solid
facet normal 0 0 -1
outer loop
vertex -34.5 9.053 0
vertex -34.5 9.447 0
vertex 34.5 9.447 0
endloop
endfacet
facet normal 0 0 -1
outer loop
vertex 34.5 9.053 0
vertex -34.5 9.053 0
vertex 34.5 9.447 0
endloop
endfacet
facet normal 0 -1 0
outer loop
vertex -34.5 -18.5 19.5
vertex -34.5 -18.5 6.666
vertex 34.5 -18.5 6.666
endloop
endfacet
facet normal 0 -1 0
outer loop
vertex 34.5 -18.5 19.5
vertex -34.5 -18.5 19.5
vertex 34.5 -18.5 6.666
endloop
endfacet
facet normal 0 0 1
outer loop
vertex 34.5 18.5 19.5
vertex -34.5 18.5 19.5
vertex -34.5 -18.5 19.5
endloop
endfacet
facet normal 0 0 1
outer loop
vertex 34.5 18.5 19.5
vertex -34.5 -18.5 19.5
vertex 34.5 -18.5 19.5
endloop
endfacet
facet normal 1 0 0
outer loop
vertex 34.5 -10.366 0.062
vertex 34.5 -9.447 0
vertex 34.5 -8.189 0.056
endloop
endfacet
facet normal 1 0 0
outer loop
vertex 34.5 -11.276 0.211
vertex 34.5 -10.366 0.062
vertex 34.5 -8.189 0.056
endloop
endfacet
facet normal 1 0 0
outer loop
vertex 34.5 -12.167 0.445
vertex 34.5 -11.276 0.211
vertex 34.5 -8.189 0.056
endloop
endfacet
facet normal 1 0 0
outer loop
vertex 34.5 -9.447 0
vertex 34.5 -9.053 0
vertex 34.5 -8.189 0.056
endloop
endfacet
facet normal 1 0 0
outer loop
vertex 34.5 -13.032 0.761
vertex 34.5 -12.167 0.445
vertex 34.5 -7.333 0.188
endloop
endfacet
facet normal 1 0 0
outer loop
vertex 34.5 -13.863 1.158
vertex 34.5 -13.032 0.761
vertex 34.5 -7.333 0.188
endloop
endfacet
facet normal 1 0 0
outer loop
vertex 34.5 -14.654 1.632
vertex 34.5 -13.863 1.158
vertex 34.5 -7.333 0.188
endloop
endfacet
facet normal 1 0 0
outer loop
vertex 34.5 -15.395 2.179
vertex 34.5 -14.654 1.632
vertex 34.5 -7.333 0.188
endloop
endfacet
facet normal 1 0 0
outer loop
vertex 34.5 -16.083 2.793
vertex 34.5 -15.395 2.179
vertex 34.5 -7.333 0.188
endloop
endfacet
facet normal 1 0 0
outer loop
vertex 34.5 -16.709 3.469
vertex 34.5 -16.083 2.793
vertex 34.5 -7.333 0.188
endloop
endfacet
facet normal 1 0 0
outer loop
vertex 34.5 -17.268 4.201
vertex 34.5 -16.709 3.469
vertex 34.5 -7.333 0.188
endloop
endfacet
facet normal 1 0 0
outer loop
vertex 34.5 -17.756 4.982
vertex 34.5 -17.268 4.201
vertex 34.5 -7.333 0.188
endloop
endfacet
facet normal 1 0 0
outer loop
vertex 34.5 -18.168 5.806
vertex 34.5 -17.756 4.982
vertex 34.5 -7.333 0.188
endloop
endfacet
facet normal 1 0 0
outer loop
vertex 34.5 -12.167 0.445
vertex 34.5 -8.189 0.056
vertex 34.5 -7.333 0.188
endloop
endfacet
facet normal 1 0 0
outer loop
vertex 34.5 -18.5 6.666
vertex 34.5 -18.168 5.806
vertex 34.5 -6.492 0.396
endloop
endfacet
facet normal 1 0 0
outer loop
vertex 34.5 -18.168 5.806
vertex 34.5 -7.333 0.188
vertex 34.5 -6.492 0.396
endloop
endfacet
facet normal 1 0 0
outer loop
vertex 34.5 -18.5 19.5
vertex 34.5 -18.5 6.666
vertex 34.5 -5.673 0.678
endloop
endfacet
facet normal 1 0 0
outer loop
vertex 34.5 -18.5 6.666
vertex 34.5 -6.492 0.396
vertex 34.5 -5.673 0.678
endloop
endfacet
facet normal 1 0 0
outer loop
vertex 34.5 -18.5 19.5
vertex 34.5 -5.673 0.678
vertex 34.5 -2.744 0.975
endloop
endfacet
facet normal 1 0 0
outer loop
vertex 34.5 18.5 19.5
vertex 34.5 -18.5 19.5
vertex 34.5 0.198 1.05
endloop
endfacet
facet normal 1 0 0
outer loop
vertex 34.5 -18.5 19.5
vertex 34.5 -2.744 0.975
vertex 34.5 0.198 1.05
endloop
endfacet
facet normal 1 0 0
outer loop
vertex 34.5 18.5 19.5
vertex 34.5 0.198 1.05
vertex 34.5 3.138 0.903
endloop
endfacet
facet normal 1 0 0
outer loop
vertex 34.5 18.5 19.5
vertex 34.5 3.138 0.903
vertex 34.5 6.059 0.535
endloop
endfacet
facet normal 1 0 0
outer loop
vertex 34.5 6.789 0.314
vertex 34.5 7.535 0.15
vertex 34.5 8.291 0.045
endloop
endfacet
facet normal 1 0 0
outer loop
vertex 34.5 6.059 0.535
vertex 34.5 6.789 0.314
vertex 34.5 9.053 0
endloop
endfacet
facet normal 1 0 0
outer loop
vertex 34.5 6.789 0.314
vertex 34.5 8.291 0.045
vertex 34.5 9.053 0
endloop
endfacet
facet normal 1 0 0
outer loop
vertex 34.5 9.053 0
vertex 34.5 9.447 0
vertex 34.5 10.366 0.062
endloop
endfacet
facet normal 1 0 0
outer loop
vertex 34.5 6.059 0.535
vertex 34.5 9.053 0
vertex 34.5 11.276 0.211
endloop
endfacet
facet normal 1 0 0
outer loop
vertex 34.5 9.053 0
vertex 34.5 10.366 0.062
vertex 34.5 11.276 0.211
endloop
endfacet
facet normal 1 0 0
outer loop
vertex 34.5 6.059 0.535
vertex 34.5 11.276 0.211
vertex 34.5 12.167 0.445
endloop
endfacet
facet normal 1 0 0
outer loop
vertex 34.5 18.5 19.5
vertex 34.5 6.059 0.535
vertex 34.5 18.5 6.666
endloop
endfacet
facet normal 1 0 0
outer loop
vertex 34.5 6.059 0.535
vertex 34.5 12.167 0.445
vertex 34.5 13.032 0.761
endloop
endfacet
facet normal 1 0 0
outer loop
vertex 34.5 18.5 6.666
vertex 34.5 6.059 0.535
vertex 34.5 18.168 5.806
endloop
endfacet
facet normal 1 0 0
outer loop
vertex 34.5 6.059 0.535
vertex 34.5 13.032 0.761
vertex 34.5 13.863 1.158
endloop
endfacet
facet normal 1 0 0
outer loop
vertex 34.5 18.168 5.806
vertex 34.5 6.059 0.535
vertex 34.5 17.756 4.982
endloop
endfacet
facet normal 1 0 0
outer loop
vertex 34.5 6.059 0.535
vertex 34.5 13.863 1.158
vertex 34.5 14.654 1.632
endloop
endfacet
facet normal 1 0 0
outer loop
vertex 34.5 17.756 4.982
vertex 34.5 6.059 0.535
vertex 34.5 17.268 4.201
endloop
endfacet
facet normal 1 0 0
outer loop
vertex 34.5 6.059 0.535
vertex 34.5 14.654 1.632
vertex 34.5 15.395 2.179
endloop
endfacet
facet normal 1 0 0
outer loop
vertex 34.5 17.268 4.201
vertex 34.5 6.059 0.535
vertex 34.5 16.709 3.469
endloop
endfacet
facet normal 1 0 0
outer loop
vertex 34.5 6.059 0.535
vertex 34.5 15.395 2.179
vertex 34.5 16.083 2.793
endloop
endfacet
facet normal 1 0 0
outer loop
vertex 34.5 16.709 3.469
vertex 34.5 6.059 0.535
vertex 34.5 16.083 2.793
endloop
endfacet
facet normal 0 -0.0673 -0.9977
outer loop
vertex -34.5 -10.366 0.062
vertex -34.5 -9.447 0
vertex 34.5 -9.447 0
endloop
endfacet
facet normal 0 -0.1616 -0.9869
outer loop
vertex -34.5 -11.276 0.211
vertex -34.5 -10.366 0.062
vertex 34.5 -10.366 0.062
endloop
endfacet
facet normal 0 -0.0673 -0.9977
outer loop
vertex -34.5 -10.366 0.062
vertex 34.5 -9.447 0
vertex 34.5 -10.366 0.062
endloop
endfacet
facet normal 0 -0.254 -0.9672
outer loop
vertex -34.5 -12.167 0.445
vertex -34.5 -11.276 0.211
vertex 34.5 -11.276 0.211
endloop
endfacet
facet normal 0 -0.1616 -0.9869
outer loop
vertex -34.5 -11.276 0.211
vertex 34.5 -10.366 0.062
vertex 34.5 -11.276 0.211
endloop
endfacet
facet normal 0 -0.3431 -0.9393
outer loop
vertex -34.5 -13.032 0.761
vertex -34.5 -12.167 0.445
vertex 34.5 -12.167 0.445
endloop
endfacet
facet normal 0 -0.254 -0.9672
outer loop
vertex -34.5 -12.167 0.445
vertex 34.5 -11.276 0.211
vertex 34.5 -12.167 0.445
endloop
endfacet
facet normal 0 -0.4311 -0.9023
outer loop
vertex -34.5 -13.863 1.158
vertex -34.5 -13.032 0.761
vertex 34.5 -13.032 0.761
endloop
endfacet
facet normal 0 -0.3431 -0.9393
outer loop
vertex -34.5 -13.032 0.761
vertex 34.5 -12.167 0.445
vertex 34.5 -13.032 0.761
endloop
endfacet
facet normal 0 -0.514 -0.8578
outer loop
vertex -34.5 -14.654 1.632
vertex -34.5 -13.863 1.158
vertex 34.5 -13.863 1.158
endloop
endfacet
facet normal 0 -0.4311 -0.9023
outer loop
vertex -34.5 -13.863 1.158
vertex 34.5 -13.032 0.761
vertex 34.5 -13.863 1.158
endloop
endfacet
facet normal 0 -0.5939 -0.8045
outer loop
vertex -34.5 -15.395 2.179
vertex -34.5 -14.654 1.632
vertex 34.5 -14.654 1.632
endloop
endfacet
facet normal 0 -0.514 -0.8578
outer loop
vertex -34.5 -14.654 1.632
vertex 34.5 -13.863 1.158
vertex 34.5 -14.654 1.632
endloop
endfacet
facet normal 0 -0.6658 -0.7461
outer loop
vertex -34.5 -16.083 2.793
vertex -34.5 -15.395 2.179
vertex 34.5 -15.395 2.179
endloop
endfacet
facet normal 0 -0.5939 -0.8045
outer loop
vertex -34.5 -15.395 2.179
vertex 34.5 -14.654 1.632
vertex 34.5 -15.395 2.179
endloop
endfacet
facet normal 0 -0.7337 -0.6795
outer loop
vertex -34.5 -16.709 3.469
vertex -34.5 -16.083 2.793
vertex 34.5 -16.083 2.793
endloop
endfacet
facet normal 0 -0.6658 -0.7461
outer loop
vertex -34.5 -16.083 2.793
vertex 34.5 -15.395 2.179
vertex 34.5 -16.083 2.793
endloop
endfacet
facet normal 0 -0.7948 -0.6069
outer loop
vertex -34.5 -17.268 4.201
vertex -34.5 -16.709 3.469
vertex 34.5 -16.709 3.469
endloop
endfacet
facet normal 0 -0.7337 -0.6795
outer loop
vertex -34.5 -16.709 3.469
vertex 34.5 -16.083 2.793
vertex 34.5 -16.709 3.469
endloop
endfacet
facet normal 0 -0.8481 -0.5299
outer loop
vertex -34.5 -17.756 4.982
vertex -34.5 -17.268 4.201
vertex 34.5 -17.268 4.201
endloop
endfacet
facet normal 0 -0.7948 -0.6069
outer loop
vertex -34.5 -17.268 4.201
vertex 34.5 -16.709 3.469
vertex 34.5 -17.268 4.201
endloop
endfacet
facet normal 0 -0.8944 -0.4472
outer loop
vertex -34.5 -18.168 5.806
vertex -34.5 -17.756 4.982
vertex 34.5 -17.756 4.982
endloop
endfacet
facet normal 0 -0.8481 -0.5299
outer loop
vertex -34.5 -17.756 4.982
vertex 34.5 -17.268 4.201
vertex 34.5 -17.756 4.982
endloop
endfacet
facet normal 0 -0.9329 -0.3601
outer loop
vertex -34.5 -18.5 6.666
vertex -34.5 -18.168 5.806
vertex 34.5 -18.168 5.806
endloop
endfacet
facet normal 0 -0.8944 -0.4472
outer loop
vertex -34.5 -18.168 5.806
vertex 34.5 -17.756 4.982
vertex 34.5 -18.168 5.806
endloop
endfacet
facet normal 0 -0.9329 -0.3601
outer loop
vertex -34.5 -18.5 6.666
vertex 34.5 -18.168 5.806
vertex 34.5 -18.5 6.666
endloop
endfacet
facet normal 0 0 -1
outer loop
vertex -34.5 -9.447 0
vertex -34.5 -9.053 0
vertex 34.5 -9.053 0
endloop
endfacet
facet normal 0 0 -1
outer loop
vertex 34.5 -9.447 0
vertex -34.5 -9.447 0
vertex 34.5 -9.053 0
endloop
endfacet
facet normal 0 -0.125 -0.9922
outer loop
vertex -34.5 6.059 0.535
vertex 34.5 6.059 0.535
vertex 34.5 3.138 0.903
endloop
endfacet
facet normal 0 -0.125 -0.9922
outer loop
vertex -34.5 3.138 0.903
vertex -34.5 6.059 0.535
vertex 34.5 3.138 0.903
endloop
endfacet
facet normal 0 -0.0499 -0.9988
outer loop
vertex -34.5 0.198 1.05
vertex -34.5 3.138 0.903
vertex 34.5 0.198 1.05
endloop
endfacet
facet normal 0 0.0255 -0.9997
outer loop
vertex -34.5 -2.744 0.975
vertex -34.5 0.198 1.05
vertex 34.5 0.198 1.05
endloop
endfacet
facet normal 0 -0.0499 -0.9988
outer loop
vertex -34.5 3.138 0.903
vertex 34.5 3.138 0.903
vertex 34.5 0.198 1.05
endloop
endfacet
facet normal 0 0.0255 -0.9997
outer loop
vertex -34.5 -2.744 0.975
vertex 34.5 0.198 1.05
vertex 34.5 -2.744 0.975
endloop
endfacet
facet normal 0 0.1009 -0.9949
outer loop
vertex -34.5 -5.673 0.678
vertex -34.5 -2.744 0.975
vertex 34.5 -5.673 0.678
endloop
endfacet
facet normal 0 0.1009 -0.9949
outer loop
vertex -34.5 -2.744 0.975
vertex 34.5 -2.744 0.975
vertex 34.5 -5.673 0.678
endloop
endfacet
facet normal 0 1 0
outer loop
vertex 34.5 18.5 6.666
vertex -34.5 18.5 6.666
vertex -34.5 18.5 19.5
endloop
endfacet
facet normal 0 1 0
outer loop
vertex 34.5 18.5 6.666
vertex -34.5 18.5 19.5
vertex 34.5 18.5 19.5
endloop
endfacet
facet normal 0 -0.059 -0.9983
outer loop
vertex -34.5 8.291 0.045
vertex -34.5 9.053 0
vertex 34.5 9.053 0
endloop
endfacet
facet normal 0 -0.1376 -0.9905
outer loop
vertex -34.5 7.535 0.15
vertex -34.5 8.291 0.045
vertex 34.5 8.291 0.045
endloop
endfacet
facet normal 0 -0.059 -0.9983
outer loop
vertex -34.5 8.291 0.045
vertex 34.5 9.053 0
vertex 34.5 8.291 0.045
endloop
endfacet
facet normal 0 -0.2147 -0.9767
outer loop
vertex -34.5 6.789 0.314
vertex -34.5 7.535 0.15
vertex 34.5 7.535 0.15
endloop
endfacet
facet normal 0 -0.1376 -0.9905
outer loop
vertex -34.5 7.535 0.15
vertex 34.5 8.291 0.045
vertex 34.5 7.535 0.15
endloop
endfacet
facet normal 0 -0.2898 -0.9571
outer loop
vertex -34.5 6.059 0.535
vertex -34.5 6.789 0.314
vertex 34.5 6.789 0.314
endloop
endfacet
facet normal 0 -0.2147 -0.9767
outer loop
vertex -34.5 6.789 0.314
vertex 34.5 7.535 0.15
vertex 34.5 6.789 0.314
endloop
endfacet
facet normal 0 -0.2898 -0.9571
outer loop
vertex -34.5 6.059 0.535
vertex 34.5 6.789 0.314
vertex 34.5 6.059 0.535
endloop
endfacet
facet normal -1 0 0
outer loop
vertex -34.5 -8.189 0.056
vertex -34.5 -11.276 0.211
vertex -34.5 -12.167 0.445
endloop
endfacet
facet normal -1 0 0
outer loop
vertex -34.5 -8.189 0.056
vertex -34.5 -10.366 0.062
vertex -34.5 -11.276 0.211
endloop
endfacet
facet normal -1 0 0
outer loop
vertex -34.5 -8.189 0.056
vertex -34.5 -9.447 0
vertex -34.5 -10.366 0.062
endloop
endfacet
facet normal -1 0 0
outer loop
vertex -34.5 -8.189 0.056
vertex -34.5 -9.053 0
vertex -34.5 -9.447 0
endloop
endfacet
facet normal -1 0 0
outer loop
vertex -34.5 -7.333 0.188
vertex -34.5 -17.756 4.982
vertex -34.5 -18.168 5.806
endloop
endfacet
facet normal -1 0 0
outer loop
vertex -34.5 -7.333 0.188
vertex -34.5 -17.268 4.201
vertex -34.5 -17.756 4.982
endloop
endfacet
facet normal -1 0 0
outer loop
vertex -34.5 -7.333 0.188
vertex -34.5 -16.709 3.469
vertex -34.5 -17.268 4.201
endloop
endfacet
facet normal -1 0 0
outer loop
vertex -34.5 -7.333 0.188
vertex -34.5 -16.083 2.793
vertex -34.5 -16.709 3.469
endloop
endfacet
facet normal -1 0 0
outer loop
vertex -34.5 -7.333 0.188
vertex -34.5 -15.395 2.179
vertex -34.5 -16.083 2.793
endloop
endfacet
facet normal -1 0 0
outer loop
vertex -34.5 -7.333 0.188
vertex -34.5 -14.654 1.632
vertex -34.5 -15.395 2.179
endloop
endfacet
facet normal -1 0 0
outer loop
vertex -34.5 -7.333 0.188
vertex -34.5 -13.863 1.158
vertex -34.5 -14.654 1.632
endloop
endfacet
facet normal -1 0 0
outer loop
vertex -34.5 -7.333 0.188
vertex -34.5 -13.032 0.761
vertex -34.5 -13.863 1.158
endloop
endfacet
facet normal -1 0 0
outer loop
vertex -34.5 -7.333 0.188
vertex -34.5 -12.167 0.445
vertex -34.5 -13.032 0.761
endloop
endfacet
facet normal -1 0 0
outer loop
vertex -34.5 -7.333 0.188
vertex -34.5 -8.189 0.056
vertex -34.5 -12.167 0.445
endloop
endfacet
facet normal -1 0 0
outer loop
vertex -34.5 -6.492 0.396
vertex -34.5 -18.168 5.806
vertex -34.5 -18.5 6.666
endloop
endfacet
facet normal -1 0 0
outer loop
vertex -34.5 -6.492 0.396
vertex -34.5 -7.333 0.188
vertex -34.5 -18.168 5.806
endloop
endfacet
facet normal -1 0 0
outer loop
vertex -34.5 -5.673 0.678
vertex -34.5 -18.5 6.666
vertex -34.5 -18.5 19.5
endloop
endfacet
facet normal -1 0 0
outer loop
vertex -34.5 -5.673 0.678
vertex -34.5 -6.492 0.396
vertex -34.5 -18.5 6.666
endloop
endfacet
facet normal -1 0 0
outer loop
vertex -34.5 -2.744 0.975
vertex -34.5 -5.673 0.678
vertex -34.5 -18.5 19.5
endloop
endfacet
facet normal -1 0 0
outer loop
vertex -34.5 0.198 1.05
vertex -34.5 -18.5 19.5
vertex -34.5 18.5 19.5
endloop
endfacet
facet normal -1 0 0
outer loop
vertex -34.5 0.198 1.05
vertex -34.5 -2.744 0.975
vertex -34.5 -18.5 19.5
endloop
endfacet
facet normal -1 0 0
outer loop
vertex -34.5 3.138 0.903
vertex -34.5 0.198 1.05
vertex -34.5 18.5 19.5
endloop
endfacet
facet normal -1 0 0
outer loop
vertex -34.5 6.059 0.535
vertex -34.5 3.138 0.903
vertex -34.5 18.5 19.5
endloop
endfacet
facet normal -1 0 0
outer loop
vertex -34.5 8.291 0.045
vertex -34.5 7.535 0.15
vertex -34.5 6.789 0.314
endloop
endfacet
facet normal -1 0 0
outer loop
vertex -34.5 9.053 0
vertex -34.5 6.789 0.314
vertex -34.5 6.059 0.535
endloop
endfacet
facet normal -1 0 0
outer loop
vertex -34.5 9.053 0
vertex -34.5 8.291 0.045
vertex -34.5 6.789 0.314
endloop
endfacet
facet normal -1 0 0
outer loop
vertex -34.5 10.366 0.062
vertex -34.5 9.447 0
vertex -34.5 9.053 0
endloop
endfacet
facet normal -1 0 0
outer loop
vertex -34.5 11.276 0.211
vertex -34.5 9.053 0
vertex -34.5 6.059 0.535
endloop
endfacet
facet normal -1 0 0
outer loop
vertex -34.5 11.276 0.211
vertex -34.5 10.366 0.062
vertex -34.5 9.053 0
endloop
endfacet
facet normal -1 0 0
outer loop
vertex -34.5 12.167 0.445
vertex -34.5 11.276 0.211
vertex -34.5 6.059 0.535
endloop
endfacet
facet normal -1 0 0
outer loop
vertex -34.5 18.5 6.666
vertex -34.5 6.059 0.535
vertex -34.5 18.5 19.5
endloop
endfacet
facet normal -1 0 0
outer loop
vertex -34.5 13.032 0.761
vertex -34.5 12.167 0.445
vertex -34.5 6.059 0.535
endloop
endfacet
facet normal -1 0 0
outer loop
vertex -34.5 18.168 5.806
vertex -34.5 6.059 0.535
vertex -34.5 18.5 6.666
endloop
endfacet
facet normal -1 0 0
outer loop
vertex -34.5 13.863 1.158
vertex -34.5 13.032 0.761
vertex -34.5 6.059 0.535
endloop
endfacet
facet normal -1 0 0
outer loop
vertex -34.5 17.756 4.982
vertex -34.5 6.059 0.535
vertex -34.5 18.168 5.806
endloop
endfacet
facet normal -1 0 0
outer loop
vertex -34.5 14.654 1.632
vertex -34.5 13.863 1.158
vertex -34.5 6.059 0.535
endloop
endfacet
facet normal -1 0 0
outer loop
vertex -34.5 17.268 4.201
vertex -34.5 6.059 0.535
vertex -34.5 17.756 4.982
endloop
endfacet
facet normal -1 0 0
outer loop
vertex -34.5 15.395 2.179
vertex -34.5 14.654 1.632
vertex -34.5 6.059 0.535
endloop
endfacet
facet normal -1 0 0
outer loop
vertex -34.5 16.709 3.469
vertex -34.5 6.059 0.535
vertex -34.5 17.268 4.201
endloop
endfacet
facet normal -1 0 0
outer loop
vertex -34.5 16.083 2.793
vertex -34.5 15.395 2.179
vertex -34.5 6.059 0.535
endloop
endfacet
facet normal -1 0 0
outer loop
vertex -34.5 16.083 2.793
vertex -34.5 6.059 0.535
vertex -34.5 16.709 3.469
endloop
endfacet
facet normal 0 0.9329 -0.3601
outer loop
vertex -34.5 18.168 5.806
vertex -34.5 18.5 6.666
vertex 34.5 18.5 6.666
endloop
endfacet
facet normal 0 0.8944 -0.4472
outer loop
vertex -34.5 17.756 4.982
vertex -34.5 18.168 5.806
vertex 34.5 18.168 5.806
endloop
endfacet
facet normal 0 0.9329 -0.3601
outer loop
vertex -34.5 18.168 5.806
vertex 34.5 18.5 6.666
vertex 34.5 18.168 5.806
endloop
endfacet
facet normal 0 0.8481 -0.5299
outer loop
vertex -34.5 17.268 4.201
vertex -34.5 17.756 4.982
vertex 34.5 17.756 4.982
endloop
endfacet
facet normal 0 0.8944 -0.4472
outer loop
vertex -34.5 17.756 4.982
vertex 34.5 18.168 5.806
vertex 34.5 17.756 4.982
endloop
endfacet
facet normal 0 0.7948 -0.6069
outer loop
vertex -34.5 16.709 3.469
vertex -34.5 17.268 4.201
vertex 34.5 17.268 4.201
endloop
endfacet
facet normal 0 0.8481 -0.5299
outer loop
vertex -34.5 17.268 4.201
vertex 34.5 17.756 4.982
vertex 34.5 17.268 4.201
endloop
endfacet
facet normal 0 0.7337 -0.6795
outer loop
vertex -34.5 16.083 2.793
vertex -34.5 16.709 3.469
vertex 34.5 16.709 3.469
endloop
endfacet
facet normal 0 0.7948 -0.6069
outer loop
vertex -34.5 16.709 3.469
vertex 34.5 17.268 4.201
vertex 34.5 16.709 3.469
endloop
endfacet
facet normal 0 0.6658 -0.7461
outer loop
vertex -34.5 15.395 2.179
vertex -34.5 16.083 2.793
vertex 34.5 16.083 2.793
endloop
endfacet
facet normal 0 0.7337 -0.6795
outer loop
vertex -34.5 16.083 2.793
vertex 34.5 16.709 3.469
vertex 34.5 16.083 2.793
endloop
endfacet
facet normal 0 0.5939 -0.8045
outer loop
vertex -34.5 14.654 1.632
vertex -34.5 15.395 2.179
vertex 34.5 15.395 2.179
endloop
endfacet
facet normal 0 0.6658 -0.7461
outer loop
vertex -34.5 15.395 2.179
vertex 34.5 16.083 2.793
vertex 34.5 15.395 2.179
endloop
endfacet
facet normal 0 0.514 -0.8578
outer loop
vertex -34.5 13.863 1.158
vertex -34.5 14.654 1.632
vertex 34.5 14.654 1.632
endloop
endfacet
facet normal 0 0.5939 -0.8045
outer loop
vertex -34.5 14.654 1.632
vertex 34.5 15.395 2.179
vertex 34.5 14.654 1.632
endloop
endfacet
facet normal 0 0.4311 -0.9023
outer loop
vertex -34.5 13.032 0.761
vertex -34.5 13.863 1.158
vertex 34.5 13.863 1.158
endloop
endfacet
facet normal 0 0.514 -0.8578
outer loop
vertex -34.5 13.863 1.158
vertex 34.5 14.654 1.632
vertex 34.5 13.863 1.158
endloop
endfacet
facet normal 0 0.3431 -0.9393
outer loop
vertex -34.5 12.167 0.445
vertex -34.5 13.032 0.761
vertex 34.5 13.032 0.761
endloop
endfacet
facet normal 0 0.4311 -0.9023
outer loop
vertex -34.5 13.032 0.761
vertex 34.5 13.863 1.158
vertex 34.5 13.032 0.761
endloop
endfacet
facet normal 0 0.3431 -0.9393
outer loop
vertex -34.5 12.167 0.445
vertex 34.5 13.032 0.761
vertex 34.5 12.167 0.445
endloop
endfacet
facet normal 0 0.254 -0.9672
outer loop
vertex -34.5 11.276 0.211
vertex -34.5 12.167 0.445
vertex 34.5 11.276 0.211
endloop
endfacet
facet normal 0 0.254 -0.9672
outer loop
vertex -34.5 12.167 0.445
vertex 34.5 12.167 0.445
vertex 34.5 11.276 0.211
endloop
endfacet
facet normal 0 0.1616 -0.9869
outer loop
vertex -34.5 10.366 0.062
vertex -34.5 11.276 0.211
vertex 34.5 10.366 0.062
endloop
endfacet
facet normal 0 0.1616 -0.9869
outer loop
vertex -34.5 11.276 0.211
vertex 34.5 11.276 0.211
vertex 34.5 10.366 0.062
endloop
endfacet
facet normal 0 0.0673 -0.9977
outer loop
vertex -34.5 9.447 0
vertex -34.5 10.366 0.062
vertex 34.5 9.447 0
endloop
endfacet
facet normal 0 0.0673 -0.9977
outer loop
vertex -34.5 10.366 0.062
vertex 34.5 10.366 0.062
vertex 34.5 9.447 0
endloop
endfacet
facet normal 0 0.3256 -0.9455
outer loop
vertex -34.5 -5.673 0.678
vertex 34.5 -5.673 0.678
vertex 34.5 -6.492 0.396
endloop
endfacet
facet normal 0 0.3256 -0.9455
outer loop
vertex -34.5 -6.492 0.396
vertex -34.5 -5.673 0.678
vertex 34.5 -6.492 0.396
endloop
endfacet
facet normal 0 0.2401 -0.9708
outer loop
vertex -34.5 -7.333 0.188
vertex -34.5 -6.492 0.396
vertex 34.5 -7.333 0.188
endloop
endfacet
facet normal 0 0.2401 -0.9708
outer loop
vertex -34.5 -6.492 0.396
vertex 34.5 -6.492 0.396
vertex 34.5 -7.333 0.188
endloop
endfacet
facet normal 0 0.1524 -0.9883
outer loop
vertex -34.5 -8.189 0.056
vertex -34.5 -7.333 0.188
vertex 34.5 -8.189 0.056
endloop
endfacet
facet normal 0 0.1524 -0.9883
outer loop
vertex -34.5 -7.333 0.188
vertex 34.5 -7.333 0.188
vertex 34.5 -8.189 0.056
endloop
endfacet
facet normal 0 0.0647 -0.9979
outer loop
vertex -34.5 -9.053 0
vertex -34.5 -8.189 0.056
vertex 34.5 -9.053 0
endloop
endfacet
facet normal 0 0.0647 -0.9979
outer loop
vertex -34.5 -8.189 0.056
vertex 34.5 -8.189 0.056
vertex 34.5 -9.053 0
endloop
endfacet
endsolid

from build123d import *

# Parameters (mm, degrees)
CROQUIS1_W              = 69
CROQUIS1_H              = 37
SALIENTE_EXTRUIR1_DEPTH = 19.5
CORTAR_EXTRUIR3_DEPTH   = 70


with BuildPart() as part:
    # Croquis1 → Saliente-Extruir1 (new body)
    with BuildSketch(Plane.XY):
        Rectangle(CROQUIS1_W, CROQUIS1_H)
    extrude(amount=SALIENTE_EXTRUIR1_DEPTH)

    # Croquis2 → Cortar-Extruir3 (cut)
    with BuildSketch(Plane(origin=(34.5, 0, 0), x_dir=(0, 0, -1), z_dir=(1, 0, 0))):
        with BuildLine():
            Line((0, 18.5), (-6.665805067, 18.5))
            ThreePointArc((-6.665805067, 18.5), (-1.896690737, 15.030939451), (0, 9.446908932))
            Line((0, 9.446908932), (0, 18.5))
        make_face()
        with BuildLine():
            Line((0, -9.053091068), (0, 9.053090641))
            ThreePointArc((0, 9.053090641), (-0.150040841, 7.534931091), (-0.535059254, 6.058759862))
            ThreePointArc((-0.535059254, 6.058759862), (-1.05, 0.19825397), (-0.677845098, -5.673048612))
            ThreePointArc((-0.677845098, -5.673048612), (-0.18835007, -7.332873528), (0, -9.053091068))
        make_face()
        with BuildLine():
            ThreePointArc((0, -9.446909359), (-1.896690336, -15.030939334), (-6.665803784, -18.5))
            Line((-6.665803784, -18.5), (0, -18.5))
            Line((0, -18.5), (0, -9.446909359))
        make_face()
    extrude(amount=-CORTAR_EXTRUIR3_DEPTH, mode=Mode.SUBTRACT)


solid = part.part
